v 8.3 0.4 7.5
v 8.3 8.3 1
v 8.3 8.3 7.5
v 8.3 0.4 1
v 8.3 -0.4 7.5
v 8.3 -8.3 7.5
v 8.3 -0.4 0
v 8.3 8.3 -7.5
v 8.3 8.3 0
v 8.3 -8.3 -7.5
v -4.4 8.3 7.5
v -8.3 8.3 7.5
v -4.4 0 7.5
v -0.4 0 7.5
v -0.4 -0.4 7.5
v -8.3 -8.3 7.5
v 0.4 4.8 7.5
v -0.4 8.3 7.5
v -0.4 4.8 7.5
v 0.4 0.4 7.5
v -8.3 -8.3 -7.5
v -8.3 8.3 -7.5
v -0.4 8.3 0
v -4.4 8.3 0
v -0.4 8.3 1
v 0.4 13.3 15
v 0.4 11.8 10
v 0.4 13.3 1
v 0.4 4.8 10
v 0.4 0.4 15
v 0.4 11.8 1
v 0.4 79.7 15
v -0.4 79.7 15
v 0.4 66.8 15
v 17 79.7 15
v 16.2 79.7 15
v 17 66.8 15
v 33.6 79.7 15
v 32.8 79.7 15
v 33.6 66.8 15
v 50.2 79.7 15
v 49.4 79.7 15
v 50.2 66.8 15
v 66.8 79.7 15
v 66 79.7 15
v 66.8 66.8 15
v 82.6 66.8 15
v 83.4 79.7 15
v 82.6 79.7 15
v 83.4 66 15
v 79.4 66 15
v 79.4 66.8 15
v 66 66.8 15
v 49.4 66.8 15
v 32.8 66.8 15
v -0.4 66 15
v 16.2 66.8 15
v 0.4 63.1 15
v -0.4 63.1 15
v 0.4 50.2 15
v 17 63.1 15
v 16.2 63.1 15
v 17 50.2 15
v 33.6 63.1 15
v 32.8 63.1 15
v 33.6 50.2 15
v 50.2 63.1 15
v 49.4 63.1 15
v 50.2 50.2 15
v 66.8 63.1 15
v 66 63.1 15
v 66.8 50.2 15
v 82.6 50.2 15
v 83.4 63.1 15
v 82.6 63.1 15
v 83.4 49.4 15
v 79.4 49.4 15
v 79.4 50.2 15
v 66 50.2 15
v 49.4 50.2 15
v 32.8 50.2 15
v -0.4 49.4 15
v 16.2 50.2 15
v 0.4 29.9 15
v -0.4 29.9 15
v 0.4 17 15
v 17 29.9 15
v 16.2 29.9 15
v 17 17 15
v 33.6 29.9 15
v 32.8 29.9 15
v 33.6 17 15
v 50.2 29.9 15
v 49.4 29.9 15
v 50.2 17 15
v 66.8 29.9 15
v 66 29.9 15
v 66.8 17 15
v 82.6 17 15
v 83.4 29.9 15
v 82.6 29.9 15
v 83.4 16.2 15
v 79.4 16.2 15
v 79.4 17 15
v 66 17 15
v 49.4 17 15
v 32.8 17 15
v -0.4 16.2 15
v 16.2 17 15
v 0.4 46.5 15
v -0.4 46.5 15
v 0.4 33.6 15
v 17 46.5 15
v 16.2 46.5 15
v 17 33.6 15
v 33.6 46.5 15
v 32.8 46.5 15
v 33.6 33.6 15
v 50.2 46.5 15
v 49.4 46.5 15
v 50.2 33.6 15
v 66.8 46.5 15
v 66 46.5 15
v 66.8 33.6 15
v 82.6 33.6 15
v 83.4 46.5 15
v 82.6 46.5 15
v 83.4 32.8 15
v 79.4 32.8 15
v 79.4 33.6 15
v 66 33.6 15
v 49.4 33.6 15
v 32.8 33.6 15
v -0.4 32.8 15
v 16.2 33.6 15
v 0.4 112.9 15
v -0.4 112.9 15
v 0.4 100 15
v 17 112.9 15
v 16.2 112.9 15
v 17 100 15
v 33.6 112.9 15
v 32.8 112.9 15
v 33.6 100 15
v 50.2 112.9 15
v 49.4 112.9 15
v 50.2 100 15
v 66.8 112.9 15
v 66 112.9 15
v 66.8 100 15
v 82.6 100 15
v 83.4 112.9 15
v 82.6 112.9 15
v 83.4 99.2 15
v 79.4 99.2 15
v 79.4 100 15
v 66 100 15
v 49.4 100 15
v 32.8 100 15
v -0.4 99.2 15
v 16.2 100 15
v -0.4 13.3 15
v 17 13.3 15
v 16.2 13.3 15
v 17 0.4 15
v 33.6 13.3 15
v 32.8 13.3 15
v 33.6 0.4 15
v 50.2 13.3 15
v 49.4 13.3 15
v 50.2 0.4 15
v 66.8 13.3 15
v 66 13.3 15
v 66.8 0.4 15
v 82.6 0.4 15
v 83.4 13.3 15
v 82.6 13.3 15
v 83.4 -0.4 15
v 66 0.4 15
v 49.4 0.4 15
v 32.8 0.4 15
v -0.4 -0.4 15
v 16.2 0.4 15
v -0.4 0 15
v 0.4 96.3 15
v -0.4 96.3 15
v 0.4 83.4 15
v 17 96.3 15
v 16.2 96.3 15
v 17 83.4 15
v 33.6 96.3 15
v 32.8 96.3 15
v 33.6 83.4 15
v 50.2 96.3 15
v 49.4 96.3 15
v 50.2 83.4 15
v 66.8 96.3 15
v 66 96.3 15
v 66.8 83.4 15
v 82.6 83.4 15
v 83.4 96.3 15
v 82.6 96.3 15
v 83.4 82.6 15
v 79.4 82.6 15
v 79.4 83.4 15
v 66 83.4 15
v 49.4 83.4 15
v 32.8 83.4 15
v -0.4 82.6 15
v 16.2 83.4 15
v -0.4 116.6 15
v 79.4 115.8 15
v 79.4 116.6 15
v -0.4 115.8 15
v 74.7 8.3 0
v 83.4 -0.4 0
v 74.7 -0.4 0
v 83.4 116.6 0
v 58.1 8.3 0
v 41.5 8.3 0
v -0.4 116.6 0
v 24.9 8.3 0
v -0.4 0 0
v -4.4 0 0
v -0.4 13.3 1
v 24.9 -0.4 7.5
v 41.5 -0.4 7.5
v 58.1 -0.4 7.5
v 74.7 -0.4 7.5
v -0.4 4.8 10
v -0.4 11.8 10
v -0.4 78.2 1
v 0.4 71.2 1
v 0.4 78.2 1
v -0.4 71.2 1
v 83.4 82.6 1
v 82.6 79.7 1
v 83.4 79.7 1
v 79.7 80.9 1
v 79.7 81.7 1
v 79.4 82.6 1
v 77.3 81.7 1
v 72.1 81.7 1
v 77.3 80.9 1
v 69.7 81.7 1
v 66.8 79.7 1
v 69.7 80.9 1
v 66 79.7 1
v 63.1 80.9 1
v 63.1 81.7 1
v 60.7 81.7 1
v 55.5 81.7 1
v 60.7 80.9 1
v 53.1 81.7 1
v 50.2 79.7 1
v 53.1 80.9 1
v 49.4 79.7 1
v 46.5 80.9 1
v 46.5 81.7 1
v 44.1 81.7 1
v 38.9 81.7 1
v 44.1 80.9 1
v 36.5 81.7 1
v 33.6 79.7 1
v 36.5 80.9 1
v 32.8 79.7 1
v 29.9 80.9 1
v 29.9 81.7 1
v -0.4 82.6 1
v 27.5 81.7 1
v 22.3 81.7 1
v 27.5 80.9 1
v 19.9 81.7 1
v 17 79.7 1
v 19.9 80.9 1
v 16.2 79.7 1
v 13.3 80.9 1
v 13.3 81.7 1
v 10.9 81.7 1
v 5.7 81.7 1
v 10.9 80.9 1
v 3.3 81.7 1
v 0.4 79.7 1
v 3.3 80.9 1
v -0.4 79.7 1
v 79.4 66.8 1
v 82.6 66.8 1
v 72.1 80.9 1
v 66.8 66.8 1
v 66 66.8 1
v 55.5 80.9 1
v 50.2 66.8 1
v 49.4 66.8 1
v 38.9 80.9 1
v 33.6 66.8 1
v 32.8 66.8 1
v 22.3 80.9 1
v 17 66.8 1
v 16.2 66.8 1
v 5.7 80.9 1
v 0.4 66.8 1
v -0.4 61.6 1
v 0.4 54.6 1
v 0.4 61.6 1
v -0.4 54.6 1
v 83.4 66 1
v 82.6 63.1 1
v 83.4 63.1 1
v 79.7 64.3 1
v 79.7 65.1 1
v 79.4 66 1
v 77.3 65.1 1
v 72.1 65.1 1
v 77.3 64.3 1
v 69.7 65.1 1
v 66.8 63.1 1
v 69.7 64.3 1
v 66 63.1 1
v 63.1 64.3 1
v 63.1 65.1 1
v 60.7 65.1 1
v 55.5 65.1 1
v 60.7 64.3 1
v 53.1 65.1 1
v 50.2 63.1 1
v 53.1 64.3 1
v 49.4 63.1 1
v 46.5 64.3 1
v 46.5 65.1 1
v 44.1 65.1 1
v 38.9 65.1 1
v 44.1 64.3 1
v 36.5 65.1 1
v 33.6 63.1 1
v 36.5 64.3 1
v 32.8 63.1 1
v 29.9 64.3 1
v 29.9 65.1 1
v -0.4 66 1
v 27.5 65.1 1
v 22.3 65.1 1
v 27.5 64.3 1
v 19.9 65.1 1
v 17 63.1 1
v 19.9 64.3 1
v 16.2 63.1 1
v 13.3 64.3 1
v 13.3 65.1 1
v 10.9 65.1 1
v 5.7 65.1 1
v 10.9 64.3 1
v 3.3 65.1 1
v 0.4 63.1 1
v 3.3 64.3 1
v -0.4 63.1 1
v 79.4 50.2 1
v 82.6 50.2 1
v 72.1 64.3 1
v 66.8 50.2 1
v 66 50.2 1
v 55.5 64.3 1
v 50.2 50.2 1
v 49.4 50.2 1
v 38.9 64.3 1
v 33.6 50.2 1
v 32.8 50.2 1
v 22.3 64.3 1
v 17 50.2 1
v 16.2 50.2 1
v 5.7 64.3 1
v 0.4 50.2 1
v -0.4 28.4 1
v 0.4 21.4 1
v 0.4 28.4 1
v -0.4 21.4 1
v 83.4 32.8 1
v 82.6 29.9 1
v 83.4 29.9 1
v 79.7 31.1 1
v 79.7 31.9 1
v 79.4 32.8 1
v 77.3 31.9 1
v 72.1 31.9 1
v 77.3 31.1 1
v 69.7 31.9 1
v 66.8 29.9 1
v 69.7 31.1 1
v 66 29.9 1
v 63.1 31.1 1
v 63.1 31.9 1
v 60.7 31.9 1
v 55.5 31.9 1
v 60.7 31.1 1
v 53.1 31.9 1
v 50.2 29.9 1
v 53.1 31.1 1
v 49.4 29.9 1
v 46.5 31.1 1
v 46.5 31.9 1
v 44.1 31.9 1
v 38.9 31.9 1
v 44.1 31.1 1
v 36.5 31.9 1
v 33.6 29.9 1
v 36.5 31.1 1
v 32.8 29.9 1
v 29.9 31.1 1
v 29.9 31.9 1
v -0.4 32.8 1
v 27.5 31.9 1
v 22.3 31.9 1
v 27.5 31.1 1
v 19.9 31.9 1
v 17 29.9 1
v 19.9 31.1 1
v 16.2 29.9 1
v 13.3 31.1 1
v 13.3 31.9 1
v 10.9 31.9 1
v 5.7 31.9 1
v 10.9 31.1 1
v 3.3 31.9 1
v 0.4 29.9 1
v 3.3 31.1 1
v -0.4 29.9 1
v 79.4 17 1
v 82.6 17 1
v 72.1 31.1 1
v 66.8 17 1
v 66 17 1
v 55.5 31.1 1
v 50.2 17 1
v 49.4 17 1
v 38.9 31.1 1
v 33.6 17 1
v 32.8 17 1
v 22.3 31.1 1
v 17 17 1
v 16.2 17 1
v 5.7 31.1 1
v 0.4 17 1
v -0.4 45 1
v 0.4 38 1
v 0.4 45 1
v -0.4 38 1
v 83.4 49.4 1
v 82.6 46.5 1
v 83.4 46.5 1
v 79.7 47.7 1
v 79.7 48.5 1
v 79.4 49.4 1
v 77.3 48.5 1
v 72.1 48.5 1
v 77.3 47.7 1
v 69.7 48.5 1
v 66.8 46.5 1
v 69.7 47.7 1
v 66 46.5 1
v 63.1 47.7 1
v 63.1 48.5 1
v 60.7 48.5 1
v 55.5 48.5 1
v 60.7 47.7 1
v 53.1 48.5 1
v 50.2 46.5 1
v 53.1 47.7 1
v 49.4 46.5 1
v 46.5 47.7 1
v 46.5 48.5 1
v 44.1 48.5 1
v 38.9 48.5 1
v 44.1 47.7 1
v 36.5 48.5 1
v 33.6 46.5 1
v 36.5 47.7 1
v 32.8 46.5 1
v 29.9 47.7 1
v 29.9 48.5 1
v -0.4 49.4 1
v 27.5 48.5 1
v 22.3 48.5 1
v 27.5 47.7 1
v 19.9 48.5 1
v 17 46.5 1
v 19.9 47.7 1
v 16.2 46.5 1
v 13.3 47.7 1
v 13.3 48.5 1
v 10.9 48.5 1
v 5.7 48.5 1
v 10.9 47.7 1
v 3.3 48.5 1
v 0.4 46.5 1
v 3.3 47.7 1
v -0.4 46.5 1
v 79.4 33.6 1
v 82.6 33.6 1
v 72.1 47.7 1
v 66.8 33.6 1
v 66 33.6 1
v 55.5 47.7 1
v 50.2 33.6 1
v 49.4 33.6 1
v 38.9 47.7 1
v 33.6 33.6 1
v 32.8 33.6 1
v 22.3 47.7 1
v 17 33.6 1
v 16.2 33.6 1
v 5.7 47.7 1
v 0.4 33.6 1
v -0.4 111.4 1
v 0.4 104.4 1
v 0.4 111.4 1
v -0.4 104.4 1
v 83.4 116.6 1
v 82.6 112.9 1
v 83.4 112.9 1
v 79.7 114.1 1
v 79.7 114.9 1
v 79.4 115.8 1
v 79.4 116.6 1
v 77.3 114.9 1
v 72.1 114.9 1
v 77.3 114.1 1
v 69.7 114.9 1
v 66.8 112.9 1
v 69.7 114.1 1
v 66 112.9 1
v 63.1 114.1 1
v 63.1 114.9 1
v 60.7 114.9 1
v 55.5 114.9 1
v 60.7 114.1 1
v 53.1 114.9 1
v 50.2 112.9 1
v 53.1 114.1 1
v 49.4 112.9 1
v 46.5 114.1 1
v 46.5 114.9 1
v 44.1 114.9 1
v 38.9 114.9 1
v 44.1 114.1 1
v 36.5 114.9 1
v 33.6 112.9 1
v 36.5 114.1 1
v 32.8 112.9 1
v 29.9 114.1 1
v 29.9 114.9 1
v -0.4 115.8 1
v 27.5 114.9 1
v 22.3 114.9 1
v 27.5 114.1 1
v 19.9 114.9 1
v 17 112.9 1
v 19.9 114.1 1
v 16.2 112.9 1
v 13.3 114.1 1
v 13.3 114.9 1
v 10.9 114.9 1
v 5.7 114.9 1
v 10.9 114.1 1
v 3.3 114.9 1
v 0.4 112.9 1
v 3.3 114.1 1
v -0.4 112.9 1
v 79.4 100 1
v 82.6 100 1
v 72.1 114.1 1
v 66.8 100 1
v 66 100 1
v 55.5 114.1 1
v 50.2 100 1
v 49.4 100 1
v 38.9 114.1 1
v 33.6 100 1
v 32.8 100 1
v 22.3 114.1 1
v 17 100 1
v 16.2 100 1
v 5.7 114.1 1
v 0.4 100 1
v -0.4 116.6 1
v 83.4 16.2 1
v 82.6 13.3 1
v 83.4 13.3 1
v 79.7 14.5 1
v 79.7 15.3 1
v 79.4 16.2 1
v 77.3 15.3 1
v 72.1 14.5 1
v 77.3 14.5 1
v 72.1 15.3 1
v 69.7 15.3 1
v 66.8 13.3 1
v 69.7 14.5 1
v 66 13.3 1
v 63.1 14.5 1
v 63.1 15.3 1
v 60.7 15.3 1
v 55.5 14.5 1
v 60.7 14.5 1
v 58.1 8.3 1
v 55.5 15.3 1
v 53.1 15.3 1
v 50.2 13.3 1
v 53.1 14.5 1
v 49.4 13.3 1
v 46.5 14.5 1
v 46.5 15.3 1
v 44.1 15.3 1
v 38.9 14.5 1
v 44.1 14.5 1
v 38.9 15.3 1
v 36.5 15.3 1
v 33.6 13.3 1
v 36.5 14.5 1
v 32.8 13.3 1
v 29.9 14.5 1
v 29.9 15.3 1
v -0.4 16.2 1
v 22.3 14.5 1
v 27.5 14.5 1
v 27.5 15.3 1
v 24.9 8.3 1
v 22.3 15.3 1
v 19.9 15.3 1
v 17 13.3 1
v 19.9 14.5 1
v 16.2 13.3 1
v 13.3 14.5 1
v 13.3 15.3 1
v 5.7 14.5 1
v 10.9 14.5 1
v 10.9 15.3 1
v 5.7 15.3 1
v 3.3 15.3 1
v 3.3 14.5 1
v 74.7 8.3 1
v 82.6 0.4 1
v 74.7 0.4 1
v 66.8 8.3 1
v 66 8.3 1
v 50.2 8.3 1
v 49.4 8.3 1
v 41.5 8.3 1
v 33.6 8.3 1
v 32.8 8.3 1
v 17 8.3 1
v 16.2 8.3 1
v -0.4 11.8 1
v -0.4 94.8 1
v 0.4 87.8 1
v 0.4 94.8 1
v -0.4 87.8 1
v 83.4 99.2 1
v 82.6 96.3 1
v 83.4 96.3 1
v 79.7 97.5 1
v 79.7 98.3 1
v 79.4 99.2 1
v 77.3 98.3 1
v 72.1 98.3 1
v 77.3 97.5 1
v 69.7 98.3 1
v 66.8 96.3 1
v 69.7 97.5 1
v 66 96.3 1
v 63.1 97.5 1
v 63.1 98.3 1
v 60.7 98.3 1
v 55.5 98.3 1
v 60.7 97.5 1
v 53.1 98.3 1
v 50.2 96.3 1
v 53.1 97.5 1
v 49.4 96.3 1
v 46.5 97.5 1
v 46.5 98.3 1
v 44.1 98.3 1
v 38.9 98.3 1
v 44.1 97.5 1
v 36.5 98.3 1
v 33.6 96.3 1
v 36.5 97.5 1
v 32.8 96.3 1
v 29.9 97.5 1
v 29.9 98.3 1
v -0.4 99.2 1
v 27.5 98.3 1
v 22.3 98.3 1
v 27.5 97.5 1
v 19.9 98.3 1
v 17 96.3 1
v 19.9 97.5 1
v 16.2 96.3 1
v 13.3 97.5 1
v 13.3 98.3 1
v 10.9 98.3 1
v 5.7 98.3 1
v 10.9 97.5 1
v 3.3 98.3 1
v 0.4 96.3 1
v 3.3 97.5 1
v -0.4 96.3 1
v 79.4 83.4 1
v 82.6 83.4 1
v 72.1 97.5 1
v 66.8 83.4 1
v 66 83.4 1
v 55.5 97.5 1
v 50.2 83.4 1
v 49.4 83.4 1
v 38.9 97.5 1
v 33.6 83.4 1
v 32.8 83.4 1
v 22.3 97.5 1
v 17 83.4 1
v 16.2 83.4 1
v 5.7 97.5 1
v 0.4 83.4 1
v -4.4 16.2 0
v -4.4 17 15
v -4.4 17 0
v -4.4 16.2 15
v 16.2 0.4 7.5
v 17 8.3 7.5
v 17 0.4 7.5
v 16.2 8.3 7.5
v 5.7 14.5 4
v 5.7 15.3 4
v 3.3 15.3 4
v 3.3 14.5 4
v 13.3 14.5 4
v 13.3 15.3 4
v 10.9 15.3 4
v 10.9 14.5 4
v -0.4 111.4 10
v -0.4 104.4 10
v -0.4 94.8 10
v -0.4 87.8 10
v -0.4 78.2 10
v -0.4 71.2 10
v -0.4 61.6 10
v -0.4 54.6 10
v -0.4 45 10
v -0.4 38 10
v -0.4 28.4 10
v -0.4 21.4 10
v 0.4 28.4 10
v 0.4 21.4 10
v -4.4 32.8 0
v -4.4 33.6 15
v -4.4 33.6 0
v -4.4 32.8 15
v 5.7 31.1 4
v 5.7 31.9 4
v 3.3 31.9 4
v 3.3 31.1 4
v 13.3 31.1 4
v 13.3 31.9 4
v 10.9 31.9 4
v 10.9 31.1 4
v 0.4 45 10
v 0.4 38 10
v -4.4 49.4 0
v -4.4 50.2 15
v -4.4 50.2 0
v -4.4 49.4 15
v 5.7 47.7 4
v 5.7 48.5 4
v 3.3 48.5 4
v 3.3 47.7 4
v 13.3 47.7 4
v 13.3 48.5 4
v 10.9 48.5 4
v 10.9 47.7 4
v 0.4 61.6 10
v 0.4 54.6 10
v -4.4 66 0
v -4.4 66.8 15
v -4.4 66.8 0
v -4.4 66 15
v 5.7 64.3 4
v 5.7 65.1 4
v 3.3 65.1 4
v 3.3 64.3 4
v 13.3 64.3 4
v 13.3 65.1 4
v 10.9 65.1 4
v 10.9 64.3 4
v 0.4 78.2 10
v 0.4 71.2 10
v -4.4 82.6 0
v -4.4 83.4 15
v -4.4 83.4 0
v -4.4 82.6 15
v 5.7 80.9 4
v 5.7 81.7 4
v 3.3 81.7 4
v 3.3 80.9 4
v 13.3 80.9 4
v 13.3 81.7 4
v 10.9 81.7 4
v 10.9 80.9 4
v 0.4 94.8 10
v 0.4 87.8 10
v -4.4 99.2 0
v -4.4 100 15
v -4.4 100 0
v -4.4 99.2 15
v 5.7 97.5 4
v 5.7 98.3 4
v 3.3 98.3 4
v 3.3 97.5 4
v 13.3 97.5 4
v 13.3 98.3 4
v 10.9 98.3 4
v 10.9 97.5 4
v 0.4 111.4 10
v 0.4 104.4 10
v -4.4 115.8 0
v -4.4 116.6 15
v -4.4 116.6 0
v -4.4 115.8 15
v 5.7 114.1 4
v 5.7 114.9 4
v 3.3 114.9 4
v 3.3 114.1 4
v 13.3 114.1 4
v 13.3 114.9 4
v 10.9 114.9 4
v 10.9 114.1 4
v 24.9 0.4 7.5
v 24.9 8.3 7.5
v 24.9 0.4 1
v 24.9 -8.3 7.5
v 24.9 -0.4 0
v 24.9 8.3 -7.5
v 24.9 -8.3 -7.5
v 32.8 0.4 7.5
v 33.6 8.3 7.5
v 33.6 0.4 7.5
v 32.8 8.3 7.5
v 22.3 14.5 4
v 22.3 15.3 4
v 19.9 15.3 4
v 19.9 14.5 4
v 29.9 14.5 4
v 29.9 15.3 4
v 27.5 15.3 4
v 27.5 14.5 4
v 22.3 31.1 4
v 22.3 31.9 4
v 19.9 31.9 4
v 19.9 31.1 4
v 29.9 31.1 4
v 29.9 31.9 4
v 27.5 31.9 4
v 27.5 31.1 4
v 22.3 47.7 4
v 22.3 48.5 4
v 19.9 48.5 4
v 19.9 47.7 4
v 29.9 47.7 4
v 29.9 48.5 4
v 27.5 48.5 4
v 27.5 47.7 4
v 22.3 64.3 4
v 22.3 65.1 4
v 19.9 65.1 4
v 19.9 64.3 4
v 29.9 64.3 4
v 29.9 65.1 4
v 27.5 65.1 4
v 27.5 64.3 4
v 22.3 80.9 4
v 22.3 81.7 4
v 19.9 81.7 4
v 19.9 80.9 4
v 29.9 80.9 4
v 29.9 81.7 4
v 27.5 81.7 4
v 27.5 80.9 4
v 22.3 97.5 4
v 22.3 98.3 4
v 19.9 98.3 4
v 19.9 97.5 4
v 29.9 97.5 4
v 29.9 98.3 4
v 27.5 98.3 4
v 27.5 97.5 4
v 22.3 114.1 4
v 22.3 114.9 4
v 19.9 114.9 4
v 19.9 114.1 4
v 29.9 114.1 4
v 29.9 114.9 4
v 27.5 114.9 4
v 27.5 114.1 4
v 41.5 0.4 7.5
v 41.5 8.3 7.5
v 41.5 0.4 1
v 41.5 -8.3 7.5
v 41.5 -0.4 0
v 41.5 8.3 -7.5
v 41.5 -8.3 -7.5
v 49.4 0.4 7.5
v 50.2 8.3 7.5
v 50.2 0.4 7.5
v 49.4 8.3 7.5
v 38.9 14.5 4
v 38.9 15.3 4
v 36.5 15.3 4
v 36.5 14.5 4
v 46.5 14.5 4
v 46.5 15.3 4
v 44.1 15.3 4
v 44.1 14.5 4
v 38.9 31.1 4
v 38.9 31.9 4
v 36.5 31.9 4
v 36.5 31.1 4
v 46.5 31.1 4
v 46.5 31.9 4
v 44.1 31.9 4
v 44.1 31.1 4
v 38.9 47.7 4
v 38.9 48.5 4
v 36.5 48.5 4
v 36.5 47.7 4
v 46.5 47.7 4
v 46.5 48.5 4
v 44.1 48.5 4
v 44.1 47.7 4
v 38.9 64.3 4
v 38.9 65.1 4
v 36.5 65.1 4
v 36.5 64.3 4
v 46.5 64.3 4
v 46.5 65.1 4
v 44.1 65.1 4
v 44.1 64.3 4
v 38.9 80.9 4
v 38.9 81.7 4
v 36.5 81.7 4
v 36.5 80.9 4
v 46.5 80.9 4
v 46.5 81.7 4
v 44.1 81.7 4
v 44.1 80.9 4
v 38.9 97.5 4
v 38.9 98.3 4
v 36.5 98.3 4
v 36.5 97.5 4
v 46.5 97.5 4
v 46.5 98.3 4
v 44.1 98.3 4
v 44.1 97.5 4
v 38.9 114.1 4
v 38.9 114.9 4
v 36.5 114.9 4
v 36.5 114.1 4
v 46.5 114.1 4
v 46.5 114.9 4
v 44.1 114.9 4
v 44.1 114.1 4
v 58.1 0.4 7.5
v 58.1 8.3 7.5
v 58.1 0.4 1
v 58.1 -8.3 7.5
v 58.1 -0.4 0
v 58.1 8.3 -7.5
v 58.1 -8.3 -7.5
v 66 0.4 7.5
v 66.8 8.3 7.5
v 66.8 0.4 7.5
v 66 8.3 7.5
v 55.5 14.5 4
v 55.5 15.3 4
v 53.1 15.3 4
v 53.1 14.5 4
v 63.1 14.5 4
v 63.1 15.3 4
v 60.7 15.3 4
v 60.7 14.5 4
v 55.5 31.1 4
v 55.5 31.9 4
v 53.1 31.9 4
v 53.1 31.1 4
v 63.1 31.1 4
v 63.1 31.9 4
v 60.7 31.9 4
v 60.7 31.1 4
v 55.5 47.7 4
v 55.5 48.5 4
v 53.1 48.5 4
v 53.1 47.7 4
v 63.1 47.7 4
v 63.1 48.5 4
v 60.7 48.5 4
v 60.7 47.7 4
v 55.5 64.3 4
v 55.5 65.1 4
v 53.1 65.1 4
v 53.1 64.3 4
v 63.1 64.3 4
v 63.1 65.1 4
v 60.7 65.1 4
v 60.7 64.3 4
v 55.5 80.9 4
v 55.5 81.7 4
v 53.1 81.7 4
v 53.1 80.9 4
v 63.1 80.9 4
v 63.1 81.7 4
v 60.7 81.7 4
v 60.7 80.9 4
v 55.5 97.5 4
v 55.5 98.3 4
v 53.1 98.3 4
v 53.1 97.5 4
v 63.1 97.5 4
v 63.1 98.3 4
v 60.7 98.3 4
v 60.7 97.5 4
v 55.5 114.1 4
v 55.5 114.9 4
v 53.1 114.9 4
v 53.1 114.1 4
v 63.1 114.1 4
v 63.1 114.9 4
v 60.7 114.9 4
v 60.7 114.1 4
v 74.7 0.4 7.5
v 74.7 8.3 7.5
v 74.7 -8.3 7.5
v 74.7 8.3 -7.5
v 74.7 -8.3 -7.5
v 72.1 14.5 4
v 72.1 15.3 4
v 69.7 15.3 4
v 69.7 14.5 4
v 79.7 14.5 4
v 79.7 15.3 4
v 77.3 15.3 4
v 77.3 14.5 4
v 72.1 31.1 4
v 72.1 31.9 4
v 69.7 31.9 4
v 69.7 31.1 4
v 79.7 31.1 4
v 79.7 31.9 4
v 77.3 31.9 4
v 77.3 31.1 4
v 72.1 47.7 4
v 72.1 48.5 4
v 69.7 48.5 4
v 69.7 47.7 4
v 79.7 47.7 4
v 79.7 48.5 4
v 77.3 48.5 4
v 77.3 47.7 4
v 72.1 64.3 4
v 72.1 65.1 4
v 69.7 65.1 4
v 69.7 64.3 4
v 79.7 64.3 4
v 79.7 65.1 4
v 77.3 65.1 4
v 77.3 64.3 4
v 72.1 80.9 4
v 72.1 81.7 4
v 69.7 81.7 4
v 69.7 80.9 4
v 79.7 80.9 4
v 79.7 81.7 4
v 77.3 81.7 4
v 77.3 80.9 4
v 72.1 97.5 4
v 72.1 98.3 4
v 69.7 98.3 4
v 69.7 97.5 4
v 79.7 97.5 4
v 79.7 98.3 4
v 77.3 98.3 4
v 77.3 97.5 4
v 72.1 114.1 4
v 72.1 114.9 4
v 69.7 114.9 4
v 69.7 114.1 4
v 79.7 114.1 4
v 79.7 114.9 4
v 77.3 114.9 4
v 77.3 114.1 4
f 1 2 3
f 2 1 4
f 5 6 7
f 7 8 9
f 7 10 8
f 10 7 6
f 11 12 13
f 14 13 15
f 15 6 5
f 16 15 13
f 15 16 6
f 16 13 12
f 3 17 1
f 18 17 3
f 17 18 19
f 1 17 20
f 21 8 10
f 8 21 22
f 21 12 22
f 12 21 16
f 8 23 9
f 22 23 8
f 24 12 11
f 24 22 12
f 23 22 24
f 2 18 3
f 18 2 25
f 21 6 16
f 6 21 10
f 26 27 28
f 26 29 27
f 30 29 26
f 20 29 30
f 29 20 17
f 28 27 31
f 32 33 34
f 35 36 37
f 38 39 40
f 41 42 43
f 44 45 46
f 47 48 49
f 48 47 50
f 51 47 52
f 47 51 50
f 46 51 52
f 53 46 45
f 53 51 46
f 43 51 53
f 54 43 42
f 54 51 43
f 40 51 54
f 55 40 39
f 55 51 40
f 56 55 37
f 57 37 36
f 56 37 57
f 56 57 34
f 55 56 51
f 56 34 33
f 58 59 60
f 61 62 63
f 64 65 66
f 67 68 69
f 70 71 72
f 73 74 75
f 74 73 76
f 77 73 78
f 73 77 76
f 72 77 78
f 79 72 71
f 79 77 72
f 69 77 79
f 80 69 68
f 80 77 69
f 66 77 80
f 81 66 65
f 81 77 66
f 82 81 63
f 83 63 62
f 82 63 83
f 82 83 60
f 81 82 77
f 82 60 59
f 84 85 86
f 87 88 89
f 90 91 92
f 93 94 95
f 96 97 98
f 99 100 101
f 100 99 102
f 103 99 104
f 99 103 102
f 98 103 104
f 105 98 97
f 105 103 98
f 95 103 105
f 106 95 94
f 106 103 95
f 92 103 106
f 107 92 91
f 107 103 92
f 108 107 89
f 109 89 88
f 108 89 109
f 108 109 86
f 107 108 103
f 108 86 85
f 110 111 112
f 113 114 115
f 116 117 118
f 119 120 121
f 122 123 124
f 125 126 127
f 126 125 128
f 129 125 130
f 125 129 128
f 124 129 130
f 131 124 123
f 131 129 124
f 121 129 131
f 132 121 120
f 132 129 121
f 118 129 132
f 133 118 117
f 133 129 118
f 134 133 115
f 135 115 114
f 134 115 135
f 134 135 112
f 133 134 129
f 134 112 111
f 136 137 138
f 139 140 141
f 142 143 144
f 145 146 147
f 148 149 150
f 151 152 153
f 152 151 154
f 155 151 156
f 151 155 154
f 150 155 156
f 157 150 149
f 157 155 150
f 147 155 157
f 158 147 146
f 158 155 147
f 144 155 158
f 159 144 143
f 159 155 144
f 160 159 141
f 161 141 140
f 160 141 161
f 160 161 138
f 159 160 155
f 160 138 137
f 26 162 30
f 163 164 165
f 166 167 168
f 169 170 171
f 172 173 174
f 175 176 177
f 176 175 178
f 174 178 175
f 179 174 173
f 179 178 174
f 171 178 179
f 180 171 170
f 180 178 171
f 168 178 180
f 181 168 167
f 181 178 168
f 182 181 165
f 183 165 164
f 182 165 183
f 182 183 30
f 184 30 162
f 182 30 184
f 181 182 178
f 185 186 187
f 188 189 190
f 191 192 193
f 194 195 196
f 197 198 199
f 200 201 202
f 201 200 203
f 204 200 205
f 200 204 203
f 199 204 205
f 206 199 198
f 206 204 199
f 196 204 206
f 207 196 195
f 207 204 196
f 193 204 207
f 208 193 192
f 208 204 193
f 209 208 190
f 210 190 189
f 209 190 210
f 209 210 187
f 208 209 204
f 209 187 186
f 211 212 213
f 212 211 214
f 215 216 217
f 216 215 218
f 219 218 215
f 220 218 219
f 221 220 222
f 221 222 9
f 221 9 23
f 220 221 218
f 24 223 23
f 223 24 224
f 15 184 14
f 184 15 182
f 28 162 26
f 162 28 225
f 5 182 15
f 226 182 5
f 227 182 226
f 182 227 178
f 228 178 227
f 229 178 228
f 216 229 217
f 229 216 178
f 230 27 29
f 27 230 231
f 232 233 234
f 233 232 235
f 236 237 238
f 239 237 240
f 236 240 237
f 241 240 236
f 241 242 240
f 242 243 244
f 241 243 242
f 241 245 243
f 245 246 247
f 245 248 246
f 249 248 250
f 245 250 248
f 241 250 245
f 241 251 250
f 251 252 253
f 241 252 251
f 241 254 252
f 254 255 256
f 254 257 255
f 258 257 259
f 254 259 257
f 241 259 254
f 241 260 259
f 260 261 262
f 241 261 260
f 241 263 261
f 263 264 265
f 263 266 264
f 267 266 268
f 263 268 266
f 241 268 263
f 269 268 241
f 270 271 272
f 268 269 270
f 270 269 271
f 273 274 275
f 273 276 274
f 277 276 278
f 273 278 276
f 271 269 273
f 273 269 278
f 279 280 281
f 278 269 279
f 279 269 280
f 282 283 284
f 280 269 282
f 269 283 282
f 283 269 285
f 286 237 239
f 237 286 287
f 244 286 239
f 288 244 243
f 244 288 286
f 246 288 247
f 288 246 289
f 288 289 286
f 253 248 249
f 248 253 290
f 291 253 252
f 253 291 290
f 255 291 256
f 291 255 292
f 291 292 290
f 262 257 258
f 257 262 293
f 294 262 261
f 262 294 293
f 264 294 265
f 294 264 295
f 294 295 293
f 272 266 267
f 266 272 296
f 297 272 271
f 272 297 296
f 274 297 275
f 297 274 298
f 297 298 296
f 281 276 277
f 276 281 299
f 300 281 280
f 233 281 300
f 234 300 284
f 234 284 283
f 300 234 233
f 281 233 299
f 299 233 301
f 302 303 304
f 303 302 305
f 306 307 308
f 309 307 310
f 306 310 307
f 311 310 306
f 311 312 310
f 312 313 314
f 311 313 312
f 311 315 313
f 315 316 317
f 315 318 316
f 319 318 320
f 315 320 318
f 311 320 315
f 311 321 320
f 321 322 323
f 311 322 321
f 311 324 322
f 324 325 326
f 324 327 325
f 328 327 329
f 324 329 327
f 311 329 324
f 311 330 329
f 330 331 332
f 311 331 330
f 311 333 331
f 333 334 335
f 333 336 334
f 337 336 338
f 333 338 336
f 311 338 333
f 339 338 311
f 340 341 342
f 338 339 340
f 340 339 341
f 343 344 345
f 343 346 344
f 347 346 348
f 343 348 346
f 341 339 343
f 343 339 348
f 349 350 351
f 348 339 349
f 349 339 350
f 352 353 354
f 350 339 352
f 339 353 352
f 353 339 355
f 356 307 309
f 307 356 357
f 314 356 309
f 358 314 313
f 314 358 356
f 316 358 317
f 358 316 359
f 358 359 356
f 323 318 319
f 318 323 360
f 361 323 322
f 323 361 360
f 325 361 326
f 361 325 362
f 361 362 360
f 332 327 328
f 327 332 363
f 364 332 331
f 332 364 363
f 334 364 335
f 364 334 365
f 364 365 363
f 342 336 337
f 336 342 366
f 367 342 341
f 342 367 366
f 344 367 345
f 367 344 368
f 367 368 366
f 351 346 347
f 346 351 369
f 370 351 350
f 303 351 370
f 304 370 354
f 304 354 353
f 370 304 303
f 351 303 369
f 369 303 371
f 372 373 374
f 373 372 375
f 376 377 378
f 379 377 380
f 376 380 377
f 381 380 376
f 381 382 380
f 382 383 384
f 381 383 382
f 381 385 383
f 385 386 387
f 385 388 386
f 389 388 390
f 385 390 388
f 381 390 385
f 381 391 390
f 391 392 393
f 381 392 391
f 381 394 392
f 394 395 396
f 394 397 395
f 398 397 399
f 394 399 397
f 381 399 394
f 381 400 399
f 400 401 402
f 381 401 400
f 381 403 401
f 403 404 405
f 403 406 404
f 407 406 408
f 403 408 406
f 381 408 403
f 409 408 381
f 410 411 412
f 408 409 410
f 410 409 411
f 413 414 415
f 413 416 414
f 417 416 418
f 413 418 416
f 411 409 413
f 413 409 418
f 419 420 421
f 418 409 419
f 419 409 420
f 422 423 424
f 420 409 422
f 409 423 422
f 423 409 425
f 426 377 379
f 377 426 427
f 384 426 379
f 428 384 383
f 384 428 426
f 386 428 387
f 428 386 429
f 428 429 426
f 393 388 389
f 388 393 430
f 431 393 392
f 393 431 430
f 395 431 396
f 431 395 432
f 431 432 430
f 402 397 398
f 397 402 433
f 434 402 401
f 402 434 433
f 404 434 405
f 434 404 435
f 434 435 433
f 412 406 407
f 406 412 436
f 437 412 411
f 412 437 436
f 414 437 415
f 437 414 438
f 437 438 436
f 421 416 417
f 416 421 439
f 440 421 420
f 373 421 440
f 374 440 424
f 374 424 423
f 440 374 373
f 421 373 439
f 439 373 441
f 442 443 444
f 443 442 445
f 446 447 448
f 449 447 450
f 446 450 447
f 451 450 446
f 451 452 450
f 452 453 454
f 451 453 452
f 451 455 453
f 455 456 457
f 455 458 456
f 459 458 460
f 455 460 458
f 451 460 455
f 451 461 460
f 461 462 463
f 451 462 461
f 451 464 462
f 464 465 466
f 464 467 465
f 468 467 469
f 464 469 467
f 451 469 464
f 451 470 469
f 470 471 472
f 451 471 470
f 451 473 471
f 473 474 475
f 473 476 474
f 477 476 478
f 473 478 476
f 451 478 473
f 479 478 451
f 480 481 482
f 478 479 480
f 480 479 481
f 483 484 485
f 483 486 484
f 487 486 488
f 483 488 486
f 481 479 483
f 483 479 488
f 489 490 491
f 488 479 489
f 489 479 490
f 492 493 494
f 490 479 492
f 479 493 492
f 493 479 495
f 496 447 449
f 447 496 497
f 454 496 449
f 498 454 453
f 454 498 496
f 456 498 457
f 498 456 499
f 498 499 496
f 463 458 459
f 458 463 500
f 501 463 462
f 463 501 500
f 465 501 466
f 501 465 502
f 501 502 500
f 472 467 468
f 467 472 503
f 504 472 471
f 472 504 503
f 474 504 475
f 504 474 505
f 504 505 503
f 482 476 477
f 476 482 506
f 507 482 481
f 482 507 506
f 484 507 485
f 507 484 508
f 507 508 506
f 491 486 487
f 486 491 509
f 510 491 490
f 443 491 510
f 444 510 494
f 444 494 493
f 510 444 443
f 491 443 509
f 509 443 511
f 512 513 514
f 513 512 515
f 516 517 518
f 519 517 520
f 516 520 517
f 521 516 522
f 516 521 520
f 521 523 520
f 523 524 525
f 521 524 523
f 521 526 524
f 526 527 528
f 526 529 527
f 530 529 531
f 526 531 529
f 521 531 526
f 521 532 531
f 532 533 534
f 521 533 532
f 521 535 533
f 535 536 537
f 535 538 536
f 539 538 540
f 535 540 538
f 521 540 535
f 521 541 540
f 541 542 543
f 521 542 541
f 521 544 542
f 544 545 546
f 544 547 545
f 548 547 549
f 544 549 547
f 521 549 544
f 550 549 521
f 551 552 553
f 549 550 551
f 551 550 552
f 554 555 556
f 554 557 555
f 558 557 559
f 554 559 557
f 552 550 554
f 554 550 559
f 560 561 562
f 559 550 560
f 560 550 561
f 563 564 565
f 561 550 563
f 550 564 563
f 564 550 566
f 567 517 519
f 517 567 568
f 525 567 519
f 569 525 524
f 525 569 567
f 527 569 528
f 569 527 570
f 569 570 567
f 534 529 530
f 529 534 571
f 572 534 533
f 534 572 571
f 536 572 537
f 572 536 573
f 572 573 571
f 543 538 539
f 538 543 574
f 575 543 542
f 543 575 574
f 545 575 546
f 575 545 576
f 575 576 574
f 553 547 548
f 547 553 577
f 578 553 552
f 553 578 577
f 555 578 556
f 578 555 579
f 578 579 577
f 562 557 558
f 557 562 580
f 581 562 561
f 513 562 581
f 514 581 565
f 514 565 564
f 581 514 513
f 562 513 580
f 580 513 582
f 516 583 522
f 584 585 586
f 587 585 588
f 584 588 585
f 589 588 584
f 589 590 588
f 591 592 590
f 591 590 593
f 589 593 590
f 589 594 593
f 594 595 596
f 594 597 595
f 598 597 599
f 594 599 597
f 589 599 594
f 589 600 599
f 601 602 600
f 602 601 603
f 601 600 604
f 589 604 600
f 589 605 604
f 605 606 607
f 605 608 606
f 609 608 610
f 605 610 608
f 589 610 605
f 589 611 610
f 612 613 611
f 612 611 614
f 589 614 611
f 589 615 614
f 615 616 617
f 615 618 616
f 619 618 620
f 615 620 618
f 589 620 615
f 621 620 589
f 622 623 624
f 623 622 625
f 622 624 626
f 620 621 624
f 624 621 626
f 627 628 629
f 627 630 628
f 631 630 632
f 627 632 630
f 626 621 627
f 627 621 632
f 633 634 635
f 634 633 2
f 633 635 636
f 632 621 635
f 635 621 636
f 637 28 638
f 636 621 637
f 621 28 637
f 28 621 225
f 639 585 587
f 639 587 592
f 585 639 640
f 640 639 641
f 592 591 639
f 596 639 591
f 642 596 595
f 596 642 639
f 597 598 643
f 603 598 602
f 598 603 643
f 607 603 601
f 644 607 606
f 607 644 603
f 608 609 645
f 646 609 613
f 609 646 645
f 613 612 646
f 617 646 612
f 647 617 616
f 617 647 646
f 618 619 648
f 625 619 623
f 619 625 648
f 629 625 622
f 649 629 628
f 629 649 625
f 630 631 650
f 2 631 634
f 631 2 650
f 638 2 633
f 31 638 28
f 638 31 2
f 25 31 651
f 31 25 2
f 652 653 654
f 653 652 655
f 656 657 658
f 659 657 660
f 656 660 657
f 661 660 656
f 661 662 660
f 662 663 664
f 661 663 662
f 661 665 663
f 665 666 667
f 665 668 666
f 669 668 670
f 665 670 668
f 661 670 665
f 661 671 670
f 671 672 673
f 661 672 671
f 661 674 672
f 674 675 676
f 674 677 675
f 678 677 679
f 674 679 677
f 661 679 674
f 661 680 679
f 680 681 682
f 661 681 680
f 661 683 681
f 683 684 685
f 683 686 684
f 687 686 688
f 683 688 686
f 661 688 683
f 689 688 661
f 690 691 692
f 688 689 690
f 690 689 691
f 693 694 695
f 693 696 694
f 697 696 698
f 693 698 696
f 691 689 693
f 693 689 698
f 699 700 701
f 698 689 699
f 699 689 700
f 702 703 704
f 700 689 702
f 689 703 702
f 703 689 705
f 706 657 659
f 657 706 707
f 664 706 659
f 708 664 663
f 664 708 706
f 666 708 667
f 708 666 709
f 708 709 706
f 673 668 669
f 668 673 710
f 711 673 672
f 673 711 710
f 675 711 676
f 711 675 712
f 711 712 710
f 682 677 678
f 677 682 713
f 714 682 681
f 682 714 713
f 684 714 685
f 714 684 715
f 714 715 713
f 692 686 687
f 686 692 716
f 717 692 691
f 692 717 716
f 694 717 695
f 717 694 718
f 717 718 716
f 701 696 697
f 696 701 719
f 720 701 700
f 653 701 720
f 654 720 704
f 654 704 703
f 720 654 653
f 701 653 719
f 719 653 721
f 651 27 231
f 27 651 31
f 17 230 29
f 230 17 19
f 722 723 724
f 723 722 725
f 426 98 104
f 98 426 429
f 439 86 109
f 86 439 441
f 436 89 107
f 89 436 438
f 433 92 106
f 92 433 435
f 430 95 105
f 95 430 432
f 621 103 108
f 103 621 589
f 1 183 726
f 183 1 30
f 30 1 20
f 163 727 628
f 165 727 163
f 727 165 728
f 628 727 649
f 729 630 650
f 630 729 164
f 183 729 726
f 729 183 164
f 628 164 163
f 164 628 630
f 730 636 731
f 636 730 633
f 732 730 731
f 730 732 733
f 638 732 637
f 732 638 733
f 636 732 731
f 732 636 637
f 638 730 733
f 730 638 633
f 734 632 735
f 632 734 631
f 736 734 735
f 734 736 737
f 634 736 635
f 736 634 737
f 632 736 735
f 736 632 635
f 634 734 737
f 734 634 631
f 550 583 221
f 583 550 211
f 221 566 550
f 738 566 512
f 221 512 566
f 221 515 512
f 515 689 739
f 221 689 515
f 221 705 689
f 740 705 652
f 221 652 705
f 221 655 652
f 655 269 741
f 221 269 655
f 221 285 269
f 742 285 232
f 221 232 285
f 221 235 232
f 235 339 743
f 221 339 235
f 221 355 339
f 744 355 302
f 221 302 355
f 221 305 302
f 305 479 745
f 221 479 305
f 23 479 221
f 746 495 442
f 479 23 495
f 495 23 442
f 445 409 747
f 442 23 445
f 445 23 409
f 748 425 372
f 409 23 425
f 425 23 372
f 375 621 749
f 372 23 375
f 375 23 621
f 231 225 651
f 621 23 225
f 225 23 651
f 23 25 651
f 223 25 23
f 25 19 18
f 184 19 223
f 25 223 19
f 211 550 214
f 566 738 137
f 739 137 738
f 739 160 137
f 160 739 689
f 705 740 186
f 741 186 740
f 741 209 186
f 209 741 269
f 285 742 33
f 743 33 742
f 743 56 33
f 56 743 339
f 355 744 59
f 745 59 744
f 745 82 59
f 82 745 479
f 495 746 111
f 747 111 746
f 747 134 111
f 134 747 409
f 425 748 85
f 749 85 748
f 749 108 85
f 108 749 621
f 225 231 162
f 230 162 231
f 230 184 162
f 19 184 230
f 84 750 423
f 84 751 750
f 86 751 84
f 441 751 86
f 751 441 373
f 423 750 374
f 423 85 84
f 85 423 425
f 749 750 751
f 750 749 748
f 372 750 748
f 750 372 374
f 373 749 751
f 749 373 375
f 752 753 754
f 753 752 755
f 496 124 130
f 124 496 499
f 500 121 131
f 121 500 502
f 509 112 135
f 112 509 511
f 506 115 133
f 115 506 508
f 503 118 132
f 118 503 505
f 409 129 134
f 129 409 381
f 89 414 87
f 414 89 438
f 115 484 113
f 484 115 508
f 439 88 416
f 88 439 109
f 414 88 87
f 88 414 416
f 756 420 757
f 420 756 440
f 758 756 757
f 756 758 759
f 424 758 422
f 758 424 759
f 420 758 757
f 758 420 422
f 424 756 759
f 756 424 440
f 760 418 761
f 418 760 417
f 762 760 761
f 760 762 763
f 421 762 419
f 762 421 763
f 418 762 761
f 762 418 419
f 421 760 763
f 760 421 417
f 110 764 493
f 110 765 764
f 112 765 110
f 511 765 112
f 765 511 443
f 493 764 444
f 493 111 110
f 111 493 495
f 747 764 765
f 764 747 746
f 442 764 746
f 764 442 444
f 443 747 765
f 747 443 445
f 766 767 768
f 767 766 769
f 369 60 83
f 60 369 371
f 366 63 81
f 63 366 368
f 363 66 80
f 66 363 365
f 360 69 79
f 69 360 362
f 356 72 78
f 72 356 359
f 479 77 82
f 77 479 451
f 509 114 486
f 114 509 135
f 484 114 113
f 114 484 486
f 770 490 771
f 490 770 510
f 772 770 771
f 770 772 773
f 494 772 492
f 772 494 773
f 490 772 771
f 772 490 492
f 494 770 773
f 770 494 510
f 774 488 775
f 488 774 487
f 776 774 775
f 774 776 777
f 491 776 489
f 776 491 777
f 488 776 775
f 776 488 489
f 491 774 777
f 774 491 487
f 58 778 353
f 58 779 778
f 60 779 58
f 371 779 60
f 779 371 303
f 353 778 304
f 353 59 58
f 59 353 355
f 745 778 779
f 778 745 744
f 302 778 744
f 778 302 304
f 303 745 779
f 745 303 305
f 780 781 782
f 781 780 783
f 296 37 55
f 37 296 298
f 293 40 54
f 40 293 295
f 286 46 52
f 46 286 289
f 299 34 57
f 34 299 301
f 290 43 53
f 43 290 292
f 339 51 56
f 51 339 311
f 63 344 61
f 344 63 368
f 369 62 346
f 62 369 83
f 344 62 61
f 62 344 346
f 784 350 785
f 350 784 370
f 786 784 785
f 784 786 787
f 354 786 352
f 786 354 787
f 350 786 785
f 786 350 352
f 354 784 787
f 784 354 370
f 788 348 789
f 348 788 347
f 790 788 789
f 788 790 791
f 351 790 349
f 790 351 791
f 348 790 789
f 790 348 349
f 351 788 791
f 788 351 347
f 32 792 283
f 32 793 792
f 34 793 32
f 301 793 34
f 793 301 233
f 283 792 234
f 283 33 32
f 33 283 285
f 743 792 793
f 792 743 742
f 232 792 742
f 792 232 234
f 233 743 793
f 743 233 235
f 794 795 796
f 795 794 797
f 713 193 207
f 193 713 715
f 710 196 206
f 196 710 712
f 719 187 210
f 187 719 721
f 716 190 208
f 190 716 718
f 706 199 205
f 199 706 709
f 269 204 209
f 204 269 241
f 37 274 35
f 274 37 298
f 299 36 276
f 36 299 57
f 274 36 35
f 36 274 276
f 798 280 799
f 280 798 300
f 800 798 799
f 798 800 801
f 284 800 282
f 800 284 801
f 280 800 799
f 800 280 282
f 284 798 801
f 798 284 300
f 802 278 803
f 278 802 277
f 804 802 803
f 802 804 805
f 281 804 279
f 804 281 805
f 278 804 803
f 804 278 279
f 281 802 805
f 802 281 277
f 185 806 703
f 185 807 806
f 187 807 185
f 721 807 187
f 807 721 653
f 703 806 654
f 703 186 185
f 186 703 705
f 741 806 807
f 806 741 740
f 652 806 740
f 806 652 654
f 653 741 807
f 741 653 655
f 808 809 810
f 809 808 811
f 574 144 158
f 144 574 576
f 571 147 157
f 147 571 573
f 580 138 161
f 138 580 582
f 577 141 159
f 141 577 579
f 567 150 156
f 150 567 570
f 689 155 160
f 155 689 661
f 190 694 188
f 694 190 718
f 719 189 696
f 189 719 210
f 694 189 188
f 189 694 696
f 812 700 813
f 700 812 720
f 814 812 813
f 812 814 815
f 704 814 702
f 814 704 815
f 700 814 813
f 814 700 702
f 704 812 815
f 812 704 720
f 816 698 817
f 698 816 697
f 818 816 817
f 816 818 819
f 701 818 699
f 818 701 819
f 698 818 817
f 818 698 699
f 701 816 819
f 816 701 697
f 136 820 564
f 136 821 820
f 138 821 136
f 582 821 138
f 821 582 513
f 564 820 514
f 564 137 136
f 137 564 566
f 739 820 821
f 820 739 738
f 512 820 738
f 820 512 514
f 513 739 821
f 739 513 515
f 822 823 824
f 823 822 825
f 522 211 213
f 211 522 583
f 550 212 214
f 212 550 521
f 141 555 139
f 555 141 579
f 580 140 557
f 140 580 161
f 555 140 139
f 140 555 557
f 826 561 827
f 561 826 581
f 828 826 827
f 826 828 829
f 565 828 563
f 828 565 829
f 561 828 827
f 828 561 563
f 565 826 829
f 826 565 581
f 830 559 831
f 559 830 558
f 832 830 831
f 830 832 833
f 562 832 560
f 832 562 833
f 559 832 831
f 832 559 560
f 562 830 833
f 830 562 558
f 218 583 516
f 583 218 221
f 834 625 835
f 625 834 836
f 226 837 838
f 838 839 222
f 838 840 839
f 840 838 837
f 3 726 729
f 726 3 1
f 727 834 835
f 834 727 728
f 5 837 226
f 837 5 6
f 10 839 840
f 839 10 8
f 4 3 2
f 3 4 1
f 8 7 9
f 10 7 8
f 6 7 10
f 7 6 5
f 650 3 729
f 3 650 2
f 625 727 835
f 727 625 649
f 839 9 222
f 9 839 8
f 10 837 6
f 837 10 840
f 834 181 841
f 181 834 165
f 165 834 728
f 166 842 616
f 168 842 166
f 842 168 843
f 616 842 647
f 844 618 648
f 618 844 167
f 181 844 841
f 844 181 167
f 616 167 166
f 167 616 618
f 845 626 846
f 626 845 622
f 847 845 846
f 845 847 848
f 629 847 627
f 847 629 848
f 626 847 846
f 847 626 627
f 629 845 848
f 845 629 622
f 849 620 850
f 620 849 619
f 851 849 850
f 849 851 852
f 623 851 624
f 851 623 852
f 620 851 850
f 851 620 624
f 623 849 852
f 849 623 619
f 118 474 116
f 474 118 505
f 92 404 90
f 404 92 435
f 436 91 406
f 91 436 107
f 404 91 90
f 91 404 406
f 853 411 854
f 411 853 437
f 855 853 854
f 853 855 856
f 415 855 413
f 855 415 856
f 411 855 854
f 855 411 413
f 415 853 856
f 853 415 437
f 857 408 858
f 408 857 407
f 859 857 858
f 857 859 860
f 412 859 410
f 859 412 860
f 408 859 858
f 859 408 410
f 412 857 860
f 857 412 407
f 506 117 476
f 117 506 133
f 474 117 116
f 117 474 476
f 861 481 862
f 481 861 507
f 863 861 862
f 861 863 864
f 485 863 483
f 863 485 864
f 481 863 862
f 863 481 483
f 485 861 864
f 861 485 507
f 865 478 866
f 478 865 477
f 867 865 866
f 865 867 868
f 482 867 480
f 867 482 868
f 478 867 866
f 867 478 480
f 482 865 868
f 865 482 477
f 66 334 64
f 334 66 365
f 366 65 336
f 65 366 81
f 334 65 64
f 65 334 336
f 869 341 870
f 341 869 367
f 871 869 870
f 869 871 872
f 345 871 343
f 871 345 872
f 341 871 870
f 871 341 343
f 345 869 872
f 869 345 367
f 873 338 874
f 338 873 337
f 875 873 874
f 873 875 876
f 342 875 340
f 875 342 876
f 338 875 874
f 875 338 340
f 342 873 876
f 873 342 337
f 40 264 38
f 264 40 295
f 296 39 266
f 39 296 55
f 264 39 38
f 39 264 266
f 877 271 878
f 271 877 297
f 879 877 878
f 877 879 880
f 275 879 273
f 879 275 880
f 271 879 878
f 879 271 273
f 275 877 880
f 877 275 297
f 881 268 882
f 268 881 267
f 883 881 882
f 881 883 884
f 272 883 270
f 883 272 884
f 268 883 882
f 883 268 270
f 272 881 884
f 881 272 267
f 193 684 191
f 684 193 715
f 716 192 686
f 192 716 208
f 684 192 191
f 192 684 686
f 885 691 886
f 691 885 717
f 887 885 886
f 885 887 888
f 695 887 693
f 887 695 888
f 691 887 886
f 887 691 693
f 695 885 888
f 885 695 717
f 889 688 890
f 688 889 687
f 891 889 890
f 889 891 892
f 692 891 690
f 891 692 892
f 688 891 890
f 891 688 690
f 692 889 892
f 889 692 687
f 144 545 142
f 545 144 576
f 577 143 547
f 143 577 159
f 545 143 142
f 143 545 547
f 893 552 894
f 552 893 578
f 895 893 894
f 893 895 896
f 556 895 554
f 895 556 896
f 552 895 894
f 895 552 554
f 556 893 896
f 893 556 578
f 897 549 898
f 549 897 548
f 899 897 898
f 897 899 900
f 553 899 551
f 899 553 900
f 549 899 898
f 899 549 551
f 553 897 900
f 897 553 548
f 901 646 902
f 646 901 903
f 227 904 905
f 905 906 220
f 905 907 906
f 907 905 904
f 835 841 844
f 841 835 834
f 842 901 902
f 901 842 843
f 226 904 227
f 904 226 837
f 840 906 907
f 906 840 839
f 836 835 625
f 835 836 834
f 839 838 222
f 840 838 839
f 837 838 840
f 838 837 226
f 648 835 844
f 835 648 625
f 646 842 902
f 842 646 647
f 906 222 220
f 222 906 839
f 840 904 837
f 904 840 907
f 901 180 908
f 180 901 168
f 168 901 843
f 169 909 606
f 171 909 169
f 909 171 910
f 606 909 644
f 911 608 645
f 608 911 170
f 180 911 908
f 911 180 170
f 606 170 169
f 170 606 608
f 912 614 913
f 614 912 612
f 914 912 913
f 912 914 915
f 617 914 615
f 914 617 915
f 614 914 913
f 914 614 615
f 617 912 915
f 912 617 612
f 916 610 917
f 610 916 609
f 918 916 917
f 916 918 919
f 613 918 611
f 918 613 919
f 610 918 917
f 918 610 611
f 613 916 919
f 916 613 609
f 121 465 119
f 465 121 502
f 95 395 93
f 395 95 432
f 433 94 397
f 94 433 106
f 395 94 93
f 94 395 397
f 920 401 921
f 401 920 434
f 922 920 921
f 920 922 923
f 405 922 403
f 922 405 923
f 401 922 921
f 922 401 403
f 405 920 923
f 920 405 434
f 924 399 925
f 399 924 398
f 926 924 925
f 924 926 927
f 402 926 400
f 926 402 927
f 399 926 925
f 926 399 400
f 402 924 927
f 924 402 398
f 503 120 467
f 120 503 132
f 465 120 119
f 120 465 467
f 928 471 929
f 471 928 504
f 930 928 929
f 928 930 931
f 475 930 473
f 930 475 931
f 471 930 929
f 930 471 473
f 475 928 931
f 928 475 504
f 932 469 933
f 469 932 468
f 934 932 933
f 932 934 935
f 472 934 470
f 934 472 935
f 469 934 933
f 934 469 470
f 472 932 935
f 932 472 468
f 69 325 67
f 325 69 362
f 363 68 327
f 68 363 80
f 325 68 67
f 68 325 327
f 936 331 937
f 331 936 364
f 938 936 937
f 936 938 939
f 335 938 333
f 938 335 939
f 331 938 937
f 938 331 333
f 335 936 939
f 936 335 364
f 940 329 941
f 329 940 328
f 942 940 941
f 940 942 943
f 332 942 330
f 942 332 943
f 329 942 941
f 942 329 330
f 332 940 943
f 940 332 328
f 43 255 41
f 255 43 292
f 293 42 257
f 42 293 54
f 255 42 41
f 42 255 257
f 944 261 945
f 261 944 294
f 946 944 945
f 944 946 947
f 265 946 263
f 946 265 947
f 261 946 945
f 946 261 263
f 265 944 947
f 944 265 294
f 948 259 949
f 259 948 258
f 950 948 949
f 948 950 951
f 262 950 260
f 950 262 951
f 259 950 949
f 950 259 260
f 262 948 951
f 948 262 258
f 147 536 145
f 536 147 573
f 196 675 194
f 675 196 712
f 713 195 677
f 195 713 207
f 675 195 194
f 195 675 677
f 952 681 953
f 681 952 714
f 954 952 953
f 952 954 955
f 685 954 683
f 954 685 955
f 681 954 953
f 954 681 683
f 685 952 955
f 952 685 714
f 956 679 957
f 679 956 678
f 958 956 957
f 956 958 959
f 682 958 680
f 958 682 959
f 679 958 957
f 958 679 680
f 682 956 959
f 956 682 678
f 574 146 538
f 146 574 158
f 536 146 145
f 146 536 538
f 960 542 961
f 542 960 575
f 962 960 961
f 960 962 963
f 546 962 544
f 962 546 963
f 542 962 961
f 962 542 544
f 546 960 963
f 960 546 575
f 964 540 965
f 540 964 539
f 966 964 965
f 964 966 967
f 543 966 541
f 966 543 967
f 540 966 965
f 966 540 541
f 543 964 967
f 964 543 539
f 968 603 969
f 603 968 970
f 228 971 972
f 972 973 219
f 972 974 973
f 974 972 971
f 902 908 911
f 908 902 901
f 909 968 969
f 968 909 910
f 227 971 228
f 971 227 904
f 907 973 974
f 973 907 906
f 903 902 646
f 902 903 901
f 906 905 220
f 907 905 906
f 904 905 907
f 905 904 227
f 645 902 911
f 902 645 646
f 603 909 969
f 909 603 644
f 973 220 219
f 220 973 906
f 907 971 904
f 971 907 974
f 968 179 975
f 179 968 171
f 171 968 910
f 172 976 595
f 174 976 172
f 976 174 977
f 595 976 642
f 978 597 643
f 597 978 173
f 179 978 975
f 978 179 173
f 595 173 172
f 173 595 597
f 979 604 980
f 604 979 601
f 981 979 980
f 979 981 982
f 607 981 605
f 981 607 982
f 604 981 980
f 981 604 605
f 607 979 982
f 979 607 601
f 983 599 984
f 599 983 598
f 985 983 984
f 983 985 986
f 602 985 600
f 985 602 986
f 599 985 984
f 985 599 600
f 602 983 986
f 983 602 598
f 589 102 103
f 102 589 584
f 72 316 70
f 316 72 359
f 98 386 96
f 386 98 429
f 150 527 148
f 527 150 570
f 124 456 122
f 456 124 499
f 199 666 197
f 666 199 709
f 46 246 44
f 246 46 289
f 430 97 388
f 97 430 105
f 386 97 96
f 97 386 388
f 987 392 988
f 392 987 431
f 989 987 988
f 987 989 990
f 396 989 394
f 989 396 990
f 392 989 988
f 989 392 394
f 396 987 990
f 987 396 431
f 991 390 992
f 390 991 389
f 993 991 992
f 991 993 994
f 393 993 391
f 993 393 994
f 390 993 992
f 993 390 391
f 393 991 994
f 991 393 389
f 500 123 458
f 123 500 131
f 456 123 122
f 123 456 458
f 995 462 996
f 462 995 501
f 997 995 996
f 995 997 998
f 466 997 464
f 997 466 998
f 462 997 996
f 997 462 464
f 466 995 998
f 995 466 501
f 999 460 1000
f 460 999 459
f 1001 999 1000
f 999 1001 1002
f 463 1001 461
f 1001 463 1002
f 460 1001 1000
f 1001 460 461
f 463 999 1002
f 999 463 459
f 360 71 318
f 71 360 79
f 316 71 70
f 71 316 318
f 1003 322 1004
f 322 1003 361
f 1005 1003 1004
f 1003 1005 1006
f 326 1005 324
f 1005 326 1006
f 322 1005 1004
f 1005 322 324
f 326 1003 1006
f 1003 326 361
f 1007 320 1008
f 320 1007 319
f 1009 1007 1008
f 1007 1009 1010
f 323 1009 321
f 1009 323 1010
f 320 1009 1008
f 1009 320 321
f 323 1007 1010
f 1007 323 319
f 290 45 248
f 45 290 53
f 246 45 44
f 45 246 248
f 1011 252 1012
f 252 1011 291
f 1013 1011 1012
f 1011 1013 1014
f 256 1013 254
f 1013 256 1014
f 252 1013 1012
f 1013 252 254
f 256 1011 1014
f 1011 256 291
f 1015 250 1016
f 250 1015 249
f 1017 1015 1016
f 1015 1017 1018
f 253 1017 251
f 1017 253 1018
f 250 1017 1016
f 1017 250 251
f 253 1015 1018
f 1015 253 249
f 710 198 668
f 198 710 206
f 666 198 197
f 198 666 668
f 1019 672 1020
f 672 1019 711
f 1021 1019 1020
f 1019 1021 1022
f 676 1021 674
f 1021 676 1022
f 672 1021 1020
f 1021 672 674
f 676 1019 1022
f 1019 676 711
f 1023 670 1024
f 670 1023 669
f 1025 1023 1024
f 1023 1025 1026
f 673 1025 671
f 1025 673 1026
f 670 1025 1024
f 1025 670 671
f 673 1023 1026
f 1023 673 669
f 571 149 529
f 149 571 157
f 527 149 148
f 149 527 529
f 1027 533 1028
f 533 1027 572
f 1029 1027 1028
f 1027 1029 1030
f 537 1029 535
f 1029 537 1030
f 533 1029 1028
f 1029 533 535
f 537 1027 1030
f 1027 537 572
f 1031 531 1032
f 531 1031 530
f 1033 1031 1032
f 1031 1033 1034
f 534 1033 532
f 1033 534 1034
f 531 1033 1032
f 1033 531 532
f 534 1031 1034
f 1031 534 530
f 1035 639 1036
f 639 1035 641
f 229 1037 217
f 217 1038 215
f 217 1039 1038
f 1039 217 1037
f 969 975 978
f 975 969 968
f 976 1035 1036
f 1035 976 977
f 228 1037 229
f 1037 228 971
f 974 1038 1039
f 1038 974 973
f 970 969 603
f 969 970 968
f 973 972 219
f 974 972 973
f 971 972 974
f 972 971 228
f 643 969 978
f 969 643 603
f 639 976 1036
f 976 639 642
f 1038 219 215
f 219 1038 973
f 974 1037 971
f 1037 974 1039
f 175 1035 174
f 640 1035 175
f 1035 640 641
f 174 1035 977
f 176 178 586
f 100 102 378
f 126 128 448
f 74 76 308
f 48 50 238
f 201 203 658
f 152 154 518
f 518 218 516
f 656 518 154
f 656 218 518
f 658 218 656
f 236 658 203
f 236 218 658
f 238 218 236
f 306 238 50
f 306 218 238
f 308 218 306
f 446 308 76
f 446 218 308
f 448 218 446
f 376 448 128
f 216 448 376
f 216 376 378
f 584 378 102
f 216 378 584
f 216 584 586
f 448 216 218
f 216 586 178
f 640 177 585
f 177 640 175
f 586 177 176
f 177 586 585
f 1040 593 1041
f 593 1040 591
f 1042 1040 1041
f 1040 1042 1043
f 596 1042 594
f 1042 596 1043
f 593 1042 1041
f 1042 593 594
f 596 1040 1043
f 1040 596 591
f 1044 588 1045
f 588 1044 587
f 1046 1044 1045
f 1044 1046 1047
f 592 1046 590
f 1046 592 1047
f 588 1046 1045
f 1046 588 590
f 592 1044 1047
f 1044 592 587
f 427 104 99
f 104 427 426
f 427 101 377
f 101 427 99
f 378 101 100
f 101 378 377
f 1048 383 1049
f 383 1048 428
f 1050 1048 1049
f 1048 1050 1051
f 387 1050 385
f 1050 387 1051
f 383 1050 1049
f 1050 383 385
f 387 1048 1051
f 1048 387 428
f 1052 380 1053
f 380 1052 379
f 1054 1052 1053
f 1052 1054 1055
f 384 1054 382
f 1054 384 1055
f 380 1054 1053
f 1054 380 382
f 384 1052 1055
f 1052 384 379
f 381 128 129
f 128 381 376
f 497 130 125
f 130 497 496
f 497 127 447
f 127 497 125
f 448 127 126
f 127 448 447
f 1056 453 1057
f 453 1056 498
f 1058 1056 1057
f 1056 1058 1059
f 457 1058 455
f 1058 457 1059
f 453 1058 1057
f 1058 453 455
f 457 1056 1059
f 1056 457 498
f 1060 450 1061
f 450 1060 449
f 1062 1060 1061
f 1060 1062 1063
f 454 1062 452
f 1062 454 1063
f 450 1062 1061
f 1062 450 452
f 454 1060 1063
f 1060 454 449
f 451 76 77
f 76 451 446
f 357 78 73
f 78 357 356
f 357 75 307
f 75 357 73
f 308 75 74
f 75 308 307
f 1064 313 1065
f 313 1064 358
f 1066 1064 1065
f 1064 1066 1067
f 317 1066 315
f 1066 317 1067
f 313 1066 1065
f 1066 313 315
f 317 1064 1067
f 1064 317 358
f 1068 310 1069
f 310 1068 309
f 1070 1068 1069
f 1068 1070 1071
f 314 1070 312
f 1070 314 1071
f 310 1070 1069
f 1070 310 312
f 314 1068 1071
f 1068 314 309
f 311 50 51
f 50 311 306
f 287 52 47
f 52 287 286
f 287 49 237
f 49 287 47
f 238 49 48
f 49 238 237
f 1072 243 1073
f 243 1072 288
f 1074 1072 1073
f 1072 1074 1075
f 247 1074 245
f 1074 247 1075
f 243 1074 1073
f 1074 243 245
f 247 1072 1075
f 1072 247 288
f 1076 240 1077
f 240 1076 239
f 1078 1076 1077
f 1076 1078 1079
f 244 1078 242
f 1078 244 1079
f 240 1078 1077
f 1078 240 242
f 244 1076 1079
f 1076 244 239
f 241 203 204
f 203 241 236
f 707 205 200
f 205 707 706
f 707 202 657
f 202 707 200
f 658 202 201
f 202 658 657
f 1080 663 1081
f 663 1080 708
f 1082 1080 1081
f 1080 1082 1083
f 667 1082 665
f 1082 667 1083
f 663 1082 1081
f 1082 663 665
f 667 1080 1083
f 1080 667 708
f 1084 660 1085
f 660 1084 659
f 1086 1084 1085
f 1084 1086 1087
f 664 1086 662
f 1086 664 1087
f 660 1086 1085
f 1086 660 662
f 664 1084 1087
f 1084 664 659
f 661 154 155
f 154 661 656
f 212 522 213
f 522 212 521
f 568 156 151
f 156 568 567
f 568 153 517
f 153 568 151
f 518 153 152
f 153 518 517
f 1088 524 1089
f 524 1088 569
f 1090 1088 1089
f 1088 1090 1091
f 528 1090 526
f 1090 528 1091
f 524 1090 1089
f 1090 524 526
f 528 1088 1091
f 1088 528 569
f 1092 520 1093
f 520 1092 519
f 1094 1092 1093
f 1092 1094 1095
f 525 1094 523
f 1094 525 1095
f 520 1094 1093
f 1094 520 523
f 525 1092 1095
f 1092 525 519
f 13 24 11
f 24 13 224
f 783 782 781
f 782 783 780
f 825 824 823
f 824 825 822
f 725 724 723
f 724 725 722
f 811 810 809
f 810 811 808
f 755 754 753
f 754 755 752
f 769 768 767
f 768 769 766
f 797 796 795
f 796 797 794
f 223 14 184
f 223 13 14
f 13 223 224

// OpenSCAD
width = 5;
height = 7;
pixelSize = 16.6;
baseThickness = 1.0;
wallThickness = 0.8;
wallHeight = 15;
stripThickness = 0.9;
ledCutoutWidth = 7;
ledCutoutHeight = 9;
ledBendspace = 4;

module pixelCell(){
    // base plate, moved to seperate file
   translate([-wallThickness/2, -wallThickness/2,0])
   cube([pixelSize+wallThickness, pixelSize+wallThickness, baseThickness]);
    
    // main walls around cell
    translate([0, -wallThickness/2, 0]){
        cube([pixelSize, wallThickness, wallHeight]);
        translate([-wallThickness/2, 0, 0]){
            difference(){
                cube([wallThickness, pixelSize-stripThickness-2.0, wallHeight]);
                // cut out hole for bypassing led strip on the end
                translate([0,pixelSize/2+wallThickness/2-ledCutoutWidth/2, baseThickness])
                cube([wallThickness, ledCutoutWidth, ledCutoutHeight]);
            }
            translate([-ledBendspace, pixelSize, 0])
            cube([pixelSize+wallThickness, wallThickness, wallHeight]);
            
        }
        translate([pixelSize-wallThickness/2, 0, 0])
        cube([wallThickness, pixelSize-stripThickness-2.0, wallHeight]);
    }
    
    // walls to hold led in place
    translate([0, pixelSize-stripThickness-wallThickness*1.5,0]){
        translate([wallThickness/2+2.9, 0, 0]){
            //rotate([0,0,-135])
            //translate([0, wallThickness, 0])
            //cube([2.9, wallThickness, 8.0]);
            cube([2.4, wallThickness, 4]);
        }
        translate([pixelSize-wallThickness/2-2.9, 0, 0]){
            //cube([2.9, wallThickness, 8.0]);
            translate([-2.4, 0, 0]){
                cube([2.4, wallThickness, 4]);
            }
        }
    }
}
//pixelCell();

difference(){
for(i=[0:1:width-1], j=[0:1:height-1]){
    translate([pixelSize*i, pixelSize*j, 0]){
        if (j == 0){    
//            cube([pixelSize, pixelSize, wallHeight]);
                translate([pixelSize/2, pixelSize/2, 5]);
                difference() {
//                    
                    cube(center=true, [pixelSize,pixelSize,wallHeight]);
                    rotate([90,0,0]) translate([0,-5,10]) cylinder(r=ledCutoutHeight/2,h=pixelSize,$fn=100) ;
                }
//            cube([pixelSize, pixelSize, wallHeight]);
//             cylinder(h=ledCutoutHeight+baseThickness, r=ledCutoutWidth/2);  
//            difference() {
//                translate([pixelSize/2, pixelSize/2, -baseThickness]) { 
//                    difference() {
//                    rotate([90, 0,0]);
//                    cylinder(h=ledCutoutHeight+baseThickness, r=ledCutoutWidth/2);   
//                    }
//                }
//            }   
        }
        if(j%2==1){
            mirror([0,1,0]);
            translate([0,-pixelSize,0]);
            pixelCell();
        }
        else{
            pixelCell();
        }
    }
};
translate([-ledBendspace-wallThickness/2, 0, 0])
cube([ledBendspace, height*pixelSize+wallThickness, wallHeight]);
}
